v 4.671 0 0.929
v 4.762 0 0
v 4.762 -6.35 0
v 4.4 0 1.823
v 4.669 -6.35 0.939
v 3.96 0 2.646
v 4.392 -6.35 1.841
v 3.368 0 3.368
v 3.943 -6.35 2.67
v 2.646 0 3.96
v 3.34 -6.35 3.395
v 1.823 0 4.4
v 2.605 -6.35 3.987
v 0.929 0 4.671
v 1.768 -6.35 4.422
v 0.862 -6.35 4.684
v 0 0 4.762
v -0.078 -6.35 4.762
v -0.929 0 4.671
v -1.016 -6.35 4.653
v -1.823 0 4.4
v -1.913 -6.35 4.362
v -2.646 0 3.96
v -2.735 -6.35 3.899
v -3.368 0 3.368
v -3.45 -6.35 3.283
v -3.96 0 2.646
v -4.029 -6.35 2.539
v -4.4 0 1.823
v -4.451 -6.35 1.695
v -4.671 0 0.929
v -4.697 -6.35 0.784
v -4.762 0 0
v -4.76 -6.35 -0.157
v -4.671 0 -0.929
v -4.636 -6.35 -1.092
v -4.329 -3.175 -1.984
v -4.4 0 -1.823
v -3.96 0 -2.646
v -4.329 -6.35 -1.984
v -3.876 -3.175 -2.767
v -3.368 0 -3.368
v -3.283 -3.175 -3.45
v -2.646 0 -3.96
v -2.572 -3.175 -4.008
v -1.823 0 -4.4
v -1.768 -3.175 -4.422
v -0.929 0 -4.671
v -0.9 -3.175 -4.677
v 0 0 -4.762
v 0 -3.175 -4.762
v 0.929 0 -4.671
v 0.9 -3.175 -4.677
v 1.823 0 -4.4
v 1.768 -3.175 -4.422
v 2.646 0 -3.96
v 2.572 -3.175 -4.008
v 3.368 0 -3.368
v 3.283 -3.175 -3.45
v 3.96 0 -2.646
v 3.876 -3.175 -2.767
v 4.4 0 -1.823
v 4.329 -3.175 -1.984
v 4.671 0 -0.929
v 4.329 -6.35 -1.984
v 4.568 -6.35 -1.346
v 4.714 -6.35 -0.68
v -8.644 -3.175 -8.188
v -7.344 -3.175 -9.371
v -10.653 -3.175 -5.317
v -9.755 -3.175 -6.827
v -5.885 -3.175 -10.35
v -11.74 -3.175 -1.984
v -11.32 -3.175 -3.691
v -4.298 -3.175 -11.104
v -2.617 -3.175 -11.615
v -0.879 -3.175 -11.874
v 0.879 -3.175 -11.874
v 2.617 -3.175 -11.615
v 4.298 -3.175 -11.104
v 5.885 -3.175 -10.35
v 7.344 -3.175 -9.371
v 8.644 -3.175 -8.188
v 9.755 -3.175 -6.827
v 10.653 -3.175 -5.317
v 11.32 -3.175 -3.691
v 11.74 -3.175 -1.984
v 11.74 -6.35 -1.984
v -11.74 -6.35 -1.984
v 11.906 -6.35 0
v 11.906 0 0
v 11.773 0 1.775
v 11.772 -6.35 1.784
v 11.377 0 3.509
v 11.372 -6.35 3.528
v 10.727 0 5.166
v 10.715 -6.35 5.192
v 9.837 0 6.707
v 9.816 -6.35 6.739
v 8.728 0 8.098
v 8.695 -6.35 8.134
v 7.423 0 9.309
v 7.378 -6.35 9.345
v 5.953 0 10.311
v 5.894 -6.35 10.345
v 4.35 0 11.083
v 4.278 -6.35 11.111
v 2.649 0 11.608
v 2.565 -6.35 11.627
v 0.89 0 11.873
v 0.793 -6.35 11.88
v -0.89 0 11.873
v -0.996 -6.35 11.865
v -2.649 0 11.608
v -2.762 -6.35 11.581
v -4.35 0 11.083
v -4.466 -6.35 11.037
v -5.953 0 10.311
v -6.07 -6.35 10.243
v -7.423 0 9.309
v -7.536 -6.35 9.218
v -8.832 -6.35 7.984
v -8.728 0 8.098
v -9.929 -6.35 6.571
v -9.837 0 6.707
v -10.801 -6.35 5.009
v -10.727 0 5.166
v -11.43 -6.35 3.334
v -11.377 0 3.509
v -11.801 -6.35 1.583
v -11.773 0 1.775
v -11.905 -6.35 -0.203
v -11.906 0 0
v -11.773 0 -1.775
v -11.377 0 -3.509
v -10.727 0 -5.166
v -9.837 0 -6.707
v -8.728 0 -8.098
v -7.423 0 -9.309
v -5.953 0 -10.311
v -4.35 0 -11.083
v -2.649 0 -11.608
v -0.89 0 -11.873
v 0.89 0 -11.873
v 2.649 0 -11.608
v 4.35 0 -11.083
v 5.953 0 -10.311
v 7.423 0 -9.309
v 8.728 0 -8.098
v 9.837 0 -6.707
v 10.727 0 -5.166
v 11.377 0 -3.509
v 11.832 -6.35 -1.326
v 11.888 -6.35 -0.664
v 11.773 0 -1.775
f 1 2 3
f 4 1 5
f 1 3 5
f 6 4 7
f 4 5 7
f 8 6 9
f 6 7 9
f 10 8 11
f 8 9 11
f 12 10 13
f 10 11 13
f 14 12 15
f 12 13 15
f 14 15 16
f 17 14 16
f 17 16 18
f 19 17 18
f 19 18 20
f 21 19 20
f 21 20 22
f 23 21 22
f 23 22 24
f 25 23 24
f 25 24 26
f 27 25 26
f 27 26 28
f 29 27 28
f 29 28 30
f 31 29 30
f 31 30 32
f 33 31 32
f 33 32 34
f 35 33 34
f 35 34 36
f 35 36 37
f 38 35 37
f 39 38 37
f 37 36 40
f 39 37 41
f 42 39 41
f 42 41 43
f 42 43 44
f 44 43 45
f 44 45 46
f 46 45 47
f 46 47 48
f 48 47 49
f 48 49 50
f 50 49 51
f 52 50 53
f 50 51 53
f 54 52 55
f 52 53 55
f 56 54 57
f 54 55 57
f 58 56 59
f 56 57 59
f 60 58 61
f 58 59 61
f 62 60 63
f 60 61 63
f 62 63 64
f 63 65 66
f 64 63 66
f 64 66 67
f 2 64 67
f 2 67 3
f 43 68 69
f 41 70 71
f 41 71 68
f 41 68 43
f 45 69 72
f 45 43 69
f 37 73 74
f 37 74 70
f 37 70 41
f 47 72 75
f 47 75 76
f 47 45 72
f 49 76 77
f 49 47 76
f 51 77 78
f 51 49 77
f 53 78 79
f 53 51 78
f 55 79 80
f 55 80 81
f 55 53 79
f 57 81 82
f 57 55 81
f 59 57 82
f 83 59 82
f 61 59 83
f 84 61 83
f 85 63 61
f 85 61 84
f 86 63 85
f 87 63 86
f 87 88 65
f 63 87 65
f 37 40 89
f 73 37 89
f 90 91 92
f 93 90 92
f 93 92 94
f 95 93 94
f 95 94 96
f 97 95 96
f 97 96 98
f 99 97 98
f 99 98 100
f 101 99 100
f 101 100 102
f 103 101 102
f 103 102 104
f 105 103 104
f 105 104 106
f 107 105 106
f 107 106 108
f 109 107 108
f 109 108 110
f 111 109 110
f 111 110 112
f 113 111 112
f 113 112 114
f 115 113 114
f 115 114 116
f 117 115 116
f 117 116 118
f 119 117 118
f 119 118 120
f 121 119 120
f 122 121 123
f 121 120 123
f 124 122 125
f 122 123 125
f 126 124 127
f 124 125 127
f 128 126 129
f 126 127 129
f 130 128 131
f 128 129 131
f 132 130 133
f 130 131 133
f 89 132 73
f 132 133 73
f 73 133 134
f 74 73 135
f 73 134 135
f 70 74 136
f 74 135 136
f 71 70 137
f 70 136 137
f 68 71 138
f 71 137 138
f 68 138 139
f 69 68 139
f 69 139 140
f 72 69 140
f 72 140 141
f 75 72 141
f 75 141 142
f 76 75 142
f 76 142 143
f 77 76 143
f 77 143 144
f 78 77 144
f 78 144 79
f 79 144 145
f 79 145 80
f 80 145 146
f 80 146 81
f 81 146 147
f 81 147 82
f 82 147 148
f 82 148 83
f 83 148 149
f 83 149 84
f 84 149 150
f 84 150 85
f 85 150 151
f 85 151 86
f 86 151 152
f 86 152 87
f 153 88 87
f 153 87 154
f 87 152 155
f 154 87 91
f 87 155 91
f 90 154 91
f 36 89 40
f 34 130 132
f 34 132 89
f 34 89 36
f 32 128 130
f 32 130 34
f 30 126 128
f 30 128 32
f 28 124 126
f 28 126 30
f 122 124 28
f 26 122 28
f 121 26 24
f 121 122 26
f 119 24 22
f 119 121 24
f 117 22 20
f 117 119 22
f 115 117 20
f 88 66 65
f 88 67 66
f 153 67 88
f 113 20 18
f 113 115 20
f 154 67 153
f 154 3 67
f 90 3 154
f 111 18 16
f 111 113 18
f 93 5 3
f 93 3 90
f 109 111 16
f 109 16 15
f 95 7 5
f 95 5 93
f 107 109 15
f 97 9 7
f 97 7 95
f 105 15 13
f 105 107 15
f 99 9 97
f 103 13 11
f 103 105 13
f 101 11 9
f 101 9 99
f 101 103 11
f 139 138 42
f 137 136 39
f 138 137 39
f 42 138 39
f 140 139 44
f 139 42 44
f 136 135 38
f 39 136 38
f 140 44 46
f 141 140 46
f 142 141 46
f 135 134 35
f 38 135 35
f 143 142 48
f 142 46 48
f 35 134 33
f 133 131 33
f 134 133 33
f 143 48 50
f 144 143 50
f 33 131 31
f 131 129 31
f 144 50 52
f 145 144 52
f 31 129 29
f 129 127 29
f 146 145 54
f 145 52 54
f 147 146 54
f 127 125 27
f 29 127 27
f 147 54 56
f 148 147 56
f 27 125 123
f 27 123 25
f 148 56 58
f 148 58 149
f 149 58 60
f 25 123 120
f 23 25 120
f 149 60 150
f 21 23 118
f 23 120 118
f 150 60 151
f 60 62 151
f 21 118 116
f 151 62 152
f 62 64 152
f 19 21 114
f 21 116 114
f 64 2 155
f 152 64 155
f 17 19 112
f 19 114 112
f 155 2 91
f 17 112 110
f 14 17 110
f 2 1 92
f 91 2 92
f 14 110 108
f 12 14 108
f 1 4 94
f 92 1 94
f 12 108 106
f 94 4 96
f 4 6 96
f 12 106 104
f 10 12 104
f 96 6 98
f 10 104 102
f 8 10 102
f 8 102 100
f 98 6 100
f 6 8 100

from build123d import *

# Parameters (mm, degrees)
F0_R     = 11.90625
F1_DEPTH = 6.35
F2_R     = 4.7625
F3_DEPTH = 25.4
F5_DEPTH = 3.175


with BuildPart() as f1:
    # F0 (on Front) → F1 (new body)
    with BuildSketch(Plane.XZ):
        Circle(F0_R)
    extrude(amount=F1_DEPTH)

    # F2 (on face) → F3 (cut)
    with BuildSketch(Plane.XZ.offset(6.35)):
        Circle(F2_R)
    extrude(amount=-F3_DEPTH, mode=Mode.SUBTRACT)

    # F4 (on face) → F5 (cut)
    with BuildSketch(Plane.XZ.offset(6.35)):
        with BuildLine():
            Line((-4.329395, -1.984375), (-11.739721, -1.984375))
            ThreePointArc((-11.739721, -1.984375), (0, -11.90625), (11.739721, -1.984375))
            Line((11.739721, -1.984375), (4.329395, -1.984375))
            ThreePointArc((4.329395, -1.984375), (0, -4.7625), (-4.329395, -1.984375))
        make_face()
        with BuildLine():
            Line((4.329395, -1.984375), (-4.329395, -1.984375))
            ThreePointArc((-4.329395, -1.984375), (0, -4.7625), (4.329395, -1.984375))
        make_face()
    extrude(amount=-F5_DEPTH, mode=Mode.SUBTRACT)


solid = f1.part
